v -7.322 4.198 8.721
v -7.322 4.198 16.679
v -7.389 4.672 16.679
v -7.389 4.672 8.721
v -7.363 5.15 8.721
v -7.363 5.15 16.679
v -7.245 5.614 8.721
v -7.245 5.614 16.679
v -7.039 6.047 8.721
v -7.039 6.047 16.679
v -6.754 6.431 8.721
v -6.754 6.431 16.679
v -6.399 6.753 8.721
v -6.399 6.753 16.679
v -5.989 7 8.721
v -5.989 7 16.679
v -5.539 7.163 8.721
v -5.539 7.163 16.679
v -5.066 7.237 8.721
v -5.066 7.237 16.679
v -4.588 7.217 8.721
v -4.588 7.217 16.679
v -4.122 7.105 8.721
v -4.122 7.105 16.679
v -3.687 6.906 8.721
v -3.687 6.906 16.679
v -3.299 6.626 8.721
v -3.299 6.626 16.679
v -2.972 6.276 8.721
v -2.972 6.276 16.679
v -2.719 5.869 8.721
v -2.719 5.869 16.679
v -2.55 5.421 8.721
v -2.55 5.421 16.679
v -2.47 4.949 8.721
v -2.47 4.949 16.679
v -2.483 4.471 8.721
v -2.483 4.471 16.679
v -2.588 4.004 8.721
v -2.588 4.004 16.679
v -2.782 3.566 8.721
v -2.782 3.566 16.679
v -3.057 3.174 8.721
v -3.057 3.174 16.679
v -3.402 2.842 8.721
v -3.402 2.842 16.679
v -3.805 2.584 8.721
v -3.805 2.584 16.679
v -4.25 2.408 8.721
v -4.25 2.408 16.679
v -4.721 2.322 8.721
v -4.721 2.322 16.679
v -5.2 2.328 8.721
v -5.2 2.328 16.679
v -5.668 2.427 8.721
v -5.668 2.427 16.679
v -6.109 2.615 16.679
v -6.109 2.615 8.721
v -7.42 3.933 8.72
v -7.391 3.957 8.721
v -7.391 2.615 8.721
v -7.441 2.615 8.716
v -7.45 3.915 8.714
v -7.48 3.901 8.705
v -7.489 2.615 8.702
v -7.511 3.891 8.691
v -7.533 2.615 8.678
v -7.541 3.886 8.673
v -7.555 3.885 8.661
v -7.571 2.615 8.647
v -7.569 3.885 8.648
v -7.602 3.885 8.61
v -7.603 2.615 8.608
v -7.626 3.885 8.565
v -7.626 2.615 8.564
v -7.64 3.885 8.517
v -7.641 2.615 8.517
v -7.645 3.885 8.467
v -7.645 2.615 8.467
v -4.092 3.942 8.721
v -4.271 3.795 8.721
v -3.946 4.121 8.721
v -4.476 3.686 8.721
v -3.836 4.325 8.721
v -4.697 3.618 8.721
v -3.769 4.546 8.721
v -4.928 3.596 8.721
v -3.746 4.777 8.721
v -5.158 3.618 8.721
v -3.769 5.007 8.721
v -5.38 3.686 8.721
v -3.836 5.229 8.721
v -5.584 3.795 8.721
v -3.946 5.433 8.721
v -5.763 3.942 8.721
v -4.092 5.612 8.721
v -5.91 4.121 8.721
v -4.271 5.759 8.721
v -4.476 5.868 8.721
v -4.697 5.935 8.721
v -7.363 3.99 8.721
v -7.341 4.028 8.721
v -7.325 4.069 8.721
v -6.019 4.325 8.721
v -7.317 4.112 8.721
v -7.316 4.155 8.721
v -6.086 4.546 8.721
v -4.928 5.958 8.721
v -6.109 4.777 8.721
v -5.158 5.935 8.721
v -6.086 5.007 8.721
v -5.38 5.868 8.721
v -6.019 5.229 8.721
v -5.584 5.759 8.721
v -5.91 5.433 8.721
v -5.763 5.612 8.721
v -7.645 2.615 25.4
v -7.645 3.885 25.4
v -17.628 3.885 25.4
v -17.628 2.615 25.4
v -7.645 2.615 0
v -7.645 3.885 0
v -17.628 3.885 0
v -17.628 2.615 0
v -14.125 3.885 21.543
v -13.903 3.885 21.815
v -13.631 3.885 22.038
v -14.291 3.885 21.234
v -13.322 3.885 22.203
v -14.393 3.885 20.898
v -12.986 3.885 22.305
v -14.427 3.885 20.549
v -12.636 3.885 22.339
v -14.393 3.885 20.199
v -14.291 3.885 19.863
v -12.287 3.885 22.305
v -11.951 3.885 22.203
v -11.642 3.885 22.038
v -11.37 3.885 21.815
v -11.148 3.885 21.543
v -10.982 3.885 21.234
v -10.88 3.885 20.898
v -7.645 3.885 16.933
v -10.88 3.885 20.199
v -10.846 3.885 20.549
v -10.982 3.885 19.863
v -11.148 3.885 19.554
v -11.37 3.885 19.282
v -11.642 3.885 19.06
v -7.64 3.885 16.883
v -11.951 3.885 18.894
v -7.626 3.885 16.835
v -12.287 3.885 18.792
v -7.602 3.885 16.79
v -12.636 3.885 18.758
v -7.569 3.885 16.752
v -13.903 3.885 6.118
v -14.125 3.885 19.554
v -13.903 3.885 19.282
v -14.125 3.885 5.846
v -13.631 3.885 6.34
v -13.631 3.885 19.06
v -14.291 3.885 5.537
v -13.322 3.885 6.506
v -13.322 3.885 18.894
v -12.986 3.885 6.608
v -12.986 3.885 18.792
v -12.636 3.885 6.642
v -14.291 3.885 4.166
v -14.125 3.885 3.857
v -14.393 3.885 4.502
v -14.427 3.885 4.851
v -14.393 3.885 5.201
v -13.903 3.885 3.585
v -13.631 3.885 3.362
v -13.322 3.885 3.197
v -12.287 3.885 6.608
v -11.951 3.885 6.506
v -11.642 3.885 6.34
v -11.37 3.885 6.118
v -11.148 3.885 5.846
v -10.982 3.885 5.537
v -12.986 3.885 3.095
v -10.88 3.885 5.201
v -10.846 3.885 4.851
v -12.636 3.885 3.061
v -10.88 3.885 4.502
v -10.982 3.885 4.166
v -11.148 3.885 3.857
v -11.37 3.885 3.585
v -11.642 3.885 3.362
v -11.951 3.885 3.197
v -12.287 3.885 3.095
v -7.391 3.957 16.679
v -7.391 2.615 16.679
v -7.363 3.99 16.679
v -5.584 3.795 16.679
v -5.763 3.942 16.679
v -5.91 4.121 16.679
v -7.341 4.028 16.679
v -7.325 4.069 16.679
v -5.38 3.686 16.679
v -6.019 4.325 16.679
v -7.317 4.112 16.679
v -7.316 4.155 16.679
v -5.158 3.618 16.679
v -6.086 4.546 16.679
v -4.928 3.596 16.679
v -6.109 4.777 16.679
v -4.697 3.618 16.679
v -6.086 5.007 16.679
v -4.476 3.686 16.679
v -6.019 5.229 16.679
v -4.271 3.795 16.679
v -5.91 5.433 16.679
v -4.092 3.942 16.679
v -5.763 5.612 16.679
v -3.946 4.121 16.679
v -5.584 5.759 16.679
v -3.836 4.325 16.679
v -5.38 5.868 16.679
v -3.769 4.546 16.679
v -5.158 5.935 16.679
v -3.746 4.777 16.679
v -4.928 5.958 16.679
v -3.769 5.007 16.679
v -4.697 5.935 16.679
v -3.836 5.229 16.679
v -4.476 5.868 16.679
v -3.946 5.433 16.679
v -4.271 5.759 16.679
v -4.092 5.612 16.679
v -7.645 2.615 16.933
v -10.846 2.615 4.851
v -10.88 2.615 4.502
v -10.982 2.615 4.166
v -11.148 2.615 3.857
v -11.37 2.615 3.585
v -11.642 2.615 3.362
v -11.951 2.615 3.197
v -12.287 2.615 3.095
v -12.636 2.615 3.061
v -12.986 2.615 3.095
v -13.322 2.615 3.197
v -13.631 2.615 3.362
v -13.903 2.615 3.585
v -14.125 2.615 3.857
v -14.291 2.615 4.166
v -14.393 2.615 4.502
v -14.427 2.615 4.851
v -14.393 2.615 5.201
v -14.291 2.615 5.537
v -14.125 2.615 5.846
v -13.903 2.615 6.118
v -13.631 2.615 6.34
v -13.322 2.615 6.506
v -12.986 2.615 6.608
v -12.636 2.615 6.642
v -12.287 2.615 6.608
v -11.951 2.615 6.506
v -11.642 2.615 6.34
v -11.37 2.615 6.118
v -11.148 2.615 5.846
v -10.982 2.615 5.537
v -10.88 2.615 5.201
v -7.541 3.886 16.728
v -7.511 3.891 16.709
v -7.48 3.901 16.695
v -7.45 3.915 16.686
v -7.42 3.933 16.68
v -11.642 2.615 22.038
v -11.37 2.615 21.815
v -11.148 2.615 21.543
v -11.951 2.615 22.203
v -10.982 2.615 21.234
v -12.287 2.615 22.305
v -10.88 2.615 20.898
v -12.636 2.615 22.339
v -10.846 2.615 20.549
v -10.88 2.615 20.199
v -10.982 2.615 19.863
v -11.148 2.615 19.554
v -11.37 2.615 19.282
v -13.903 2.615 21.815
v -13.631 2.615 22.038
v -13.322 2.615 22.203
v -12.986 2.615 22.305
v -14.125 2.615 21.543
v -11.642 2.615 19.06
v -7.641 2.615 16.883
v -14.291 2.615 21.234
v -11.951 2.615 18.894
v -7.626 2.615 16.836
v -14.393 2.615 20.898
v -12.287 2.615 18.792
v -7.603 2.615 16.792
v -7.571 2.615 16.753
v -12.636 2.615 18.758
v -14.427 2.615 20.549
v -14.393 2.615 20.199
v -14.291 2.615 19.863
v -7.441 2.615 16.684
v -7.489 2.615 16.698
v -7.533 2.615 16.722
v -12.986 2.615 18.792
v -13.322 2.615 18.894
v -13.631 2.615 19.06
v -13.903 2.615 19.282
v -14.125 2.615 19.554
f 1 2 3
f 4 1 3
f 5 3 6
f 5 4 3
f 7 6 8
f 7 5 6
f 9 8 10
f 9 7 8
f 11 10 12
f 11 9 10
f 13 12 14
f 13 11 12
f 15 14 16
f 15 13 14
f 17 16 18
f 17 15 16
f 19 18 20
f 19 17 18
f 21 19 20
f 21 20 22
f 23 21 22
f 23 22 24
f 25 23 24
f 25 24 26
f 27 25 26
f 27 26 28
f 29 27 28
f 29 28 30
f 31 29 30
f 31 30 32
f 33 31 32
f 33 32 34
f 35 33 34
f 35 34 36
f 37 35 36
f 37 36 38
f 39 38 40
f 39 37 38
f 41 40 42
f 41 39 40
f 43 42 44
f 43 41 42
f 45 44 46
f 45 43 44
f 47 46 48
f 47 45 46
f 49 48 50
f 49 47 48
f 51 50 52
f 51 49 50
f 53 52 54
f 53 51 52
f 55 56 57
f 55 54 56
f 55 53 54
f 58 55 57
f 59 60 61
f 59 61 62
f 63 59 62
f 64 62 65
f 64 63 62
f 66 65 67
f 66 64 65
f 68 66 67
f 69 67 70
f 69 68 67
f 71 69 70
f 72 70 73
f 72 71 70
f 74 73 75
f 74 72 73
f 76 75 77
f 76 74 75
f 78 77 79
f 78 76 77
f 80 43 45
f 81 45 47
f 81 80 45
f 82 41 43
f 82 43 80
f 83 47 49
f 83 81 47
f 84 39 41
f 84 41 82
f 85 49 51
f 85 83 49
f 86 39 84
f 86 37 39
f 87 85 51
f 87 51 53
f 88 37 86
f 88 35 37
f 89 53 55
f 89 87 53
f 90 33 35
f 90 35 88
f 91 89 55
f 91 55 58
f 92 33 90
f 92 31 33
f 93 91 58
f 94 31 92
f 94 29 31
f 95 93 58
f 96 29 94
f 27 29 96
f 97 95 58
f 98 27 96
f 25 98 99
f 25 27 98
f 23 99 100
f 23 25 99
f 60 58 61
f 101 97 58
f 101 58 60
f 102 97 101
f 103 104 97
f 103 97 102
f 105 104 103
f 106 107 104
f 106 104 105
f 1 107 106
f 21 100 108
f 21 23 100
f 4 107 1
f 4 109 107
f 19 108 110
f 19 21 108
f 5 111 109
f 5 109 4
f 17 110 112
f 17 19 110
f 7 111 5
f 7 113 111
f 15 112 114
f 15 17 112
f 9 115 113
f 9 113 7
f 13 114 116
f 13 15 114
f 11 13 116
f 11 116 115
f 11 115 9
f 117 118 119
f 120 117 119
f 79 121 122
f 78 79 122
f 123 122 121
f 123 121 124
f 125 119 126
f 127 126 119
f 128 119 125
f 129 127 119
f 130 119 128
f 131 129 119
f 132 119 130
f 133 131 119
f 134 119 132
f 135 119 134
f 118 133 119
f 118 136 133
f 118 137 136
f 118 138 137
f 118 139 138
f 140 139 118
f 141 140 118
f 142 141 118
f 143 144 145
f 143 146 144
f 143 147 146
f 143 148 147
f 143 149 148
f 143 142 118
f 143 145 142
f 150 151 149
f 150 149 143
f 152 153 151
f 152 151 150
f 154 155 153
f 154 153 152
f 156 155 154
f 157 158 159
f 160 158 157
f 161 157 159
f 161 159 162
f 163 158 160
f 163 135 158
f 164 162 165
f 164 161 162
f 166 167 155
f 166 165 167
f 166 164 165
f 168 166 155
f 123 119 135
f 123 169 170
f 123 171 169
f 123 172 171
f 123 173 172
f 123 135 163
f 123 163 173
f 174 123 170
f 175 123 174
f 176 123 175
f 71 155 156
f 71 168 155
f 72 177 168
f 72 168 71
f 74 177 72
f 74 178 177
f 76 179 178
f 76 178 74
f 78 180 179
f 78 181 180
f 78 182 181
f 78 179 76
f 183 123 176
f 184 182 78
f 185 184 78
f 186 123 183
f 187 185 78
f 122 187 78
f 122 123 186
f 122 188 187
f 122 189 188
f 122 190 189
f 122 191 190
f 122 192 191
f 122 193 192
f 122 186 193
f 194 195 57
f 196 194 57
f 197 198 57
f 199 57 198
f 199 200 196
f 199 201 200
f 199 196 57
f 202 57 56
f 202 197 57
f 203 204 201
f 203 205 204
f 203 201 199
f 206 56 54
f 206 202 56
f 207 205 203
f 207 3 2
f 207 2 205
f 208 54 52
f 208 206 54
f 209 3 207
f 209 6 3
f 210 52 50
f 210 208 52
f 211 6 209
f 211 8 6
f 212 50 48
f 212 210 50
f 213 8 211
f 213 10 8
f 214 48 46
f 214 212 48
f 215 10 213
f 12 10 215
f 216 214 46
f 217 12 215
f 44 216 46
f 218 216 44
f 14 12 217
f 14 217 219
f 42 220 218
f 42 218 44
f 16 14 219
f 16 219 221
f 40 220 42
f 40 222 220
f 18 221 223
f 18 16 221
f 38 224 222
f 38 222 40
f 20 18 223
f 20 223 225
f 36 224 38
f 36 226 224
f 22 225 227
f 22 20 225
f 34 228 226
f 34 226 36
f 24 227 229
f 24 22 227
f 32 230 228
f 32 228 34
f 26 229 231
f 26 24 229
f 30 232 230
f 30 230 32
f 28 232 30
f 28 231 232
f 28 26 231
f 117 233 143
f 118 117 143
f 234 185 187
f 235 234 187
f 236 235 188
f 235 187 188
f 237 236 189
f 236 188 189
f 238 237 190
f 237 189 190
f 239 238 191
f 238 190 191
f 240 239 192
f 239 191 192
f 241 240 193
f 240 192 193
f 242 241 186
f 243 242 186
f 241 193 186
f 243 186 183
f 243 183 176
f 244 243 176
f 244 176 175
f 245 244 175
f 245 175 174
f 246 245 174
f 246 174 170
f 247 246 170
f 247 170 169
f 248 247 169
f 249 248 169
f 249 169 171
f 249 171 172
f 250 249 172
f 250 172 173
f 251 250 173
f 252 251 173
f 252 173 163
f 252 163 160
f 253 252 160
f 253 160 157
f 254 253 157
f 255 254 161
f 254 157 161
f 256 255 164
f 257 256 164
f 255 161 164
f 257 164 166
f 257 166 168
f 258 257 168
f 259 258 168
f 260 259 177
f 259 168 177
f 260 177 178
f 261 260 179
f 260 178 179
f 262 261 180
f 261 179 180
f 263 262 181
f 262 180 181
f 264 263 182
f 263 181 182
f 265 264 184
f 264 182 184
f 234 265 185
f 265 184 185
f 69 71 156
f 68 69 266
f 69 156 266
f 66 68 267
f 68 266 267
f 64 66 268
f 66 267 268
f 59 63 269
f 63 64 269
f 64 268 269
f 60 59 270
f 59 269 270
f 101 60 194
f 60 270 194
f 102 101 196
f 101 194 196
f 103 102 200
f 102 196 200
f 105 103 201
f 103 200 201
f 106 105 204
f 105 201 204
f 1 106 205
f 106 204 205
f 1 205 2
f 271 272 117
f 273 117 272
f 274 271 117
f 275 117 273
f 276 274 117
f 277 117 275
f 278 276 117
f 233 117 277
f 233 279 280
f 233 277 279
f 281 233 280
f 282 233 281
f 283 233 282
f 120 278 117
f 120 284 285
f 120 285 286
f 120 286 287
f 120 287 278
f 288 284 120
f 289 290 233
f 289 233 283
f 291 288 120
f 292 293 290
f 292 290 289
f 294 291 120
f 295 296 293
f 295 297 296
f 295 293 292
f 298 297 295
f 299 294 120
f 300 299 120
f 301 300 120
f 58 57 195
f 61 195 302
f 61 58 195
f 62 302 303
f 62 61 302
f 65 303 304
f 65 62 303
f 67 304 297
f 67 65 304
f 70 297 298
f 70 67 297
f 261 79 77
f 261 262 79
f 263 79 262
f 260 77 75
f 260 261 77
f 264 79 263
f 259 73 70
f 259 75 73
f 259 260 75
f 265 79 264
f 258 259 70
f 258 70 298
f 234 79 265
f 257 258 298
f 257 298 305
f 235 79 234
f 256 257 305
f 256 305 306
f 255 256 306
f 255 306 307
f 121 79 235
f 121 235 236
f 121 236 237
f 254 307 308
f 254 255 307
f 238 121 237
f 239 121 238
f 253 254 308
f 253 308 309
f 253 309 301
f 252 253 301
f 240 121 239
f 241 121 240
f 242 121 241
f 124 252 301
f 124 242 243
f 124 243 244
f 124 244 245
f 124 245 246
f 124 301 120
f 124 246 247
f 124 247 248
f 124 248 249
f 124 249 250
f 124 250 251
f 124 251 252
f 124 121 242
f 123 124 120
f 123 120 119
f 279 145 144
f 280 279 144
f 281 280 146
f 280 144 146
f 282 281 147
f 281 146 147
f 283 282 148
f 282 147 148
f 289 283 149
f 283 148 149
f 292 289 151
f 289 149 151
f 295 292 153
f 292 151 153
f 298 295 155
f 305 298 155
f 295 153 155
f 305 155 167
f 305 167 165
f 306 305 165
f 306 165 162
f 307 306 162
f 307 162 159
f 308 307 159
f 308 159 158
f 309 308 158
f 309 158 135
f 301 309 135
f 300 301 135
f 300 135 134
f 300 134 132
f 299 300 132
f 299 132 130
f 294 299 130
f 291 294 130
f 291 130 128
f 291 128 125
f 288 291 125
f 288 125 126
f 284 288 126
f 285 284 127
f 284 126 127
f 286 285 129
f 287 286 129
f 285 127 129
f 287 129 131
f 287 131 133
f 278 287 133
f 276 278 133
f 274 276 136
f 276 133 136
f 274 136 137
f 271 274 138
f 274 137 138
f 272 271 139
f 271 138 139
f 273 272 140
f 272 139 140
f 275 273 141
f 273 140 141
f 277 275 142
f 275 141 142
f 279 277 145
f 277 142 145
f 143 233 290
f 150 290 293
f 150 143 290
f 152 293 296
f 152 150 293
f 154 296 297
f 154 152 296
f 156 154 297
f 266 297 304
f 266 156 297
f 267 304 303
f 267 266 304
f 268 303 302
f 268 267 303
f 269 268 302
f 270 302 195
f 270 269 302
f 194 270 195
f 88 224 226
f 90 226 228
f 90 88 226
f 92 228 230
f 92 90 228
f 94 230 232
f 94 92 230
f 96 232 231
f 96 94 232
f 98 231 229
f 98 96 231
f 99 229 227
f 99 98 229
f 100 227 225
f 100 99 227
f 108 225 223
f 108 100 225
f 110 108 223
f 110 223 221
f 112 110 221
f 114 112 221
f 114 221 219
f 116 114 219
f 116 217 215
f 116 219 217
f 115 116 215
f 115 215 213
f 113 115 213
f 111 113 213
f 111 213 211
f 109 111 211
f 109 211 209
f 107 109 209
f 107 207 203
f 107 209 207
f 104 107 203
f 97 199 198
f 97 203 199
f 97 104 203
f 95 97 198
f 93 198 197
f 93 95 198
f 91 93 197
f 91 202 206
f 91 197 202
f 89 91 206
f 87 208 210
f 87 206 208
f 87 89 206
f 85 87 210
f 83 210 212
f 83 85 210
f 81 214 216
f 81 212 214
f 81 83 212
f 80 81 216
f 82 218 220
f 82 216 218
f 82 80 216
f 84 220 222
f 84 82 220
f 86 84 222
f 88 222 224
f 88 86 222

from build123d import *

# Parameters (mm, degrees)
SKETCH1_R           = 1.1811
BOSS_EXTRUDE1_DEPTH = 25.4
FILLET2_R           = 0.254
SKETCH2_R           = 2.4638
CUT_EXTRUDE1_DEPTH  = 8.72109
SKETCH3_R           = 2.4638
CUT_EXTRUDE2_DEPTH  = 8.72109
SKETCH5_W           = 1.7273194
SKETCH5_H           = 1.763863254
CUT_EXTRUDE3_DEPTH  = 8.72109
SKETCH6_W           = 1.964621561
SKETCH6_H           = 1.893145227
CUT_EXTRUDE4_DEPTH  = 8.72109
FILLET3_R           = 0.254
FILLET4_R           = 0.254
SKETCH7_R           = 1.7907
CUT_EXTRUDE5_DEPTH  = 2.54


with BuildPart() as part:
    # Sketch1 → Boss-Extrude1 (new body)
    with BuildSketch(Plane.XY):
        with BuildLine():
            Line((-17.6276, 2.614576368), (-17.6276, 3.884576368))
            Line((-17.6276, 3.884576368), (-7.224163794, 3.884576368))
            ThreePointArc((-7.224163794, 3.884576368), (-3.076448638, 6.402723098), (-6.1087, 2.614576368))
            Line((-6.1087, 2.614576368), (-17.6276, 2.614576368))
        make_face()
        with Locations((-4.9276, 4.776823632)):
            Circle(SKETCH1_R, mode=Mode.SUBTRACT)
    extrude(amount=BOSS_EXTRUDE1_DEPTH)

    # Fillet2
    fillet2_edges = [part.edges().sort_by_distance(p)[0] for p in [
        (-7.224163794, 3.884576368, 12.7),
    ]]
    fillet(fillet2_edges, radius=FILLET2_R)

    # Sketch2 → Cut-Extrude1 (cut)
    with BuildSketch(Plane(origin=(0, 0, 0), x_dir=(-1, 0, 0), z_dir=(0, 0, -1))):
        with Locations((4.9276, 4.776823632)):
            Circle(SKETCH2_R)
    extrude(amount=-CUT_EXTRUDE1_DEPTH, mode=Mode.SUBTRACT)

    # Sketch3 → Cut-Extrude2 (cut)
    with BuildSketch(Plane.XY.offset(25.4)):
        with Locations((-4.9276, 4.776823632)):
            Circle(SKETCH3_R)
    extrude(amount=-CUT_EXTRUDE2_DEPTH, mode=Mode.SUBTRACT)

    # Sketch5 → Cut-Extrude3 (cut)
    with BuildSketch(Plane(origin=(0, 0, 0), x_dir=(-1, 0, 0), z_dir=(0, 0, -1))):
        with Locations((6.7817403, 3.496507995)):
            Rectangle(SKETCH5_W, SKETCH5_H)
    extrude(amount=-CUT_EXTRUDE3_DEPTH, mode=Mode.SUBTRACT)

    # Sketch6 → Cut-Extrude4 (cut)
    with BuildSketch(Plane.XY.offset(25.4)):
        with Locations((-6.663089219, 3.561148982)):
            Rectangle(SKETCH6_W, SKETCH6_H)
    extrude(amount=-CUT_EXTRUDE4_DEPTH, mode=Mode.SUBTRACT)

    # Fillet3
    fillet3_edges = [part.edges().sort_by_distance(p)[0] for p in [
        (-7.6454, 3.249576368, 16.67891),
    ]]
    fillet(fillet3_edges, radius=FILLET3_R)

    # Fillet4
    fillet4_edges = [part.edges().sort_by_distance(p)[0] for p in [
        (-7.6454, 3.249576368, 8.72109),
    ]]
    fillet(fillet4_edges, radius=FILLET4_R)

    # Sketch7 → Cut-Extrude5 (cut)
    with BuildSketch(Plane(origin=(0, 3.884576368, 0), x_dir=(1, 0, 0), z_dir=(0, 1, 0))):
        with Locations((-12.6365, -4.8514)):
            Circle(SKETCH7_R)
        with Locations((-12.6365, -20.5486)):
            Circle(SKETCH7_R)
    extrude(amount=-CUT_EXTRUDE5_DEPTH, mode=Mode.SUBTRACT)


solid = part.part
